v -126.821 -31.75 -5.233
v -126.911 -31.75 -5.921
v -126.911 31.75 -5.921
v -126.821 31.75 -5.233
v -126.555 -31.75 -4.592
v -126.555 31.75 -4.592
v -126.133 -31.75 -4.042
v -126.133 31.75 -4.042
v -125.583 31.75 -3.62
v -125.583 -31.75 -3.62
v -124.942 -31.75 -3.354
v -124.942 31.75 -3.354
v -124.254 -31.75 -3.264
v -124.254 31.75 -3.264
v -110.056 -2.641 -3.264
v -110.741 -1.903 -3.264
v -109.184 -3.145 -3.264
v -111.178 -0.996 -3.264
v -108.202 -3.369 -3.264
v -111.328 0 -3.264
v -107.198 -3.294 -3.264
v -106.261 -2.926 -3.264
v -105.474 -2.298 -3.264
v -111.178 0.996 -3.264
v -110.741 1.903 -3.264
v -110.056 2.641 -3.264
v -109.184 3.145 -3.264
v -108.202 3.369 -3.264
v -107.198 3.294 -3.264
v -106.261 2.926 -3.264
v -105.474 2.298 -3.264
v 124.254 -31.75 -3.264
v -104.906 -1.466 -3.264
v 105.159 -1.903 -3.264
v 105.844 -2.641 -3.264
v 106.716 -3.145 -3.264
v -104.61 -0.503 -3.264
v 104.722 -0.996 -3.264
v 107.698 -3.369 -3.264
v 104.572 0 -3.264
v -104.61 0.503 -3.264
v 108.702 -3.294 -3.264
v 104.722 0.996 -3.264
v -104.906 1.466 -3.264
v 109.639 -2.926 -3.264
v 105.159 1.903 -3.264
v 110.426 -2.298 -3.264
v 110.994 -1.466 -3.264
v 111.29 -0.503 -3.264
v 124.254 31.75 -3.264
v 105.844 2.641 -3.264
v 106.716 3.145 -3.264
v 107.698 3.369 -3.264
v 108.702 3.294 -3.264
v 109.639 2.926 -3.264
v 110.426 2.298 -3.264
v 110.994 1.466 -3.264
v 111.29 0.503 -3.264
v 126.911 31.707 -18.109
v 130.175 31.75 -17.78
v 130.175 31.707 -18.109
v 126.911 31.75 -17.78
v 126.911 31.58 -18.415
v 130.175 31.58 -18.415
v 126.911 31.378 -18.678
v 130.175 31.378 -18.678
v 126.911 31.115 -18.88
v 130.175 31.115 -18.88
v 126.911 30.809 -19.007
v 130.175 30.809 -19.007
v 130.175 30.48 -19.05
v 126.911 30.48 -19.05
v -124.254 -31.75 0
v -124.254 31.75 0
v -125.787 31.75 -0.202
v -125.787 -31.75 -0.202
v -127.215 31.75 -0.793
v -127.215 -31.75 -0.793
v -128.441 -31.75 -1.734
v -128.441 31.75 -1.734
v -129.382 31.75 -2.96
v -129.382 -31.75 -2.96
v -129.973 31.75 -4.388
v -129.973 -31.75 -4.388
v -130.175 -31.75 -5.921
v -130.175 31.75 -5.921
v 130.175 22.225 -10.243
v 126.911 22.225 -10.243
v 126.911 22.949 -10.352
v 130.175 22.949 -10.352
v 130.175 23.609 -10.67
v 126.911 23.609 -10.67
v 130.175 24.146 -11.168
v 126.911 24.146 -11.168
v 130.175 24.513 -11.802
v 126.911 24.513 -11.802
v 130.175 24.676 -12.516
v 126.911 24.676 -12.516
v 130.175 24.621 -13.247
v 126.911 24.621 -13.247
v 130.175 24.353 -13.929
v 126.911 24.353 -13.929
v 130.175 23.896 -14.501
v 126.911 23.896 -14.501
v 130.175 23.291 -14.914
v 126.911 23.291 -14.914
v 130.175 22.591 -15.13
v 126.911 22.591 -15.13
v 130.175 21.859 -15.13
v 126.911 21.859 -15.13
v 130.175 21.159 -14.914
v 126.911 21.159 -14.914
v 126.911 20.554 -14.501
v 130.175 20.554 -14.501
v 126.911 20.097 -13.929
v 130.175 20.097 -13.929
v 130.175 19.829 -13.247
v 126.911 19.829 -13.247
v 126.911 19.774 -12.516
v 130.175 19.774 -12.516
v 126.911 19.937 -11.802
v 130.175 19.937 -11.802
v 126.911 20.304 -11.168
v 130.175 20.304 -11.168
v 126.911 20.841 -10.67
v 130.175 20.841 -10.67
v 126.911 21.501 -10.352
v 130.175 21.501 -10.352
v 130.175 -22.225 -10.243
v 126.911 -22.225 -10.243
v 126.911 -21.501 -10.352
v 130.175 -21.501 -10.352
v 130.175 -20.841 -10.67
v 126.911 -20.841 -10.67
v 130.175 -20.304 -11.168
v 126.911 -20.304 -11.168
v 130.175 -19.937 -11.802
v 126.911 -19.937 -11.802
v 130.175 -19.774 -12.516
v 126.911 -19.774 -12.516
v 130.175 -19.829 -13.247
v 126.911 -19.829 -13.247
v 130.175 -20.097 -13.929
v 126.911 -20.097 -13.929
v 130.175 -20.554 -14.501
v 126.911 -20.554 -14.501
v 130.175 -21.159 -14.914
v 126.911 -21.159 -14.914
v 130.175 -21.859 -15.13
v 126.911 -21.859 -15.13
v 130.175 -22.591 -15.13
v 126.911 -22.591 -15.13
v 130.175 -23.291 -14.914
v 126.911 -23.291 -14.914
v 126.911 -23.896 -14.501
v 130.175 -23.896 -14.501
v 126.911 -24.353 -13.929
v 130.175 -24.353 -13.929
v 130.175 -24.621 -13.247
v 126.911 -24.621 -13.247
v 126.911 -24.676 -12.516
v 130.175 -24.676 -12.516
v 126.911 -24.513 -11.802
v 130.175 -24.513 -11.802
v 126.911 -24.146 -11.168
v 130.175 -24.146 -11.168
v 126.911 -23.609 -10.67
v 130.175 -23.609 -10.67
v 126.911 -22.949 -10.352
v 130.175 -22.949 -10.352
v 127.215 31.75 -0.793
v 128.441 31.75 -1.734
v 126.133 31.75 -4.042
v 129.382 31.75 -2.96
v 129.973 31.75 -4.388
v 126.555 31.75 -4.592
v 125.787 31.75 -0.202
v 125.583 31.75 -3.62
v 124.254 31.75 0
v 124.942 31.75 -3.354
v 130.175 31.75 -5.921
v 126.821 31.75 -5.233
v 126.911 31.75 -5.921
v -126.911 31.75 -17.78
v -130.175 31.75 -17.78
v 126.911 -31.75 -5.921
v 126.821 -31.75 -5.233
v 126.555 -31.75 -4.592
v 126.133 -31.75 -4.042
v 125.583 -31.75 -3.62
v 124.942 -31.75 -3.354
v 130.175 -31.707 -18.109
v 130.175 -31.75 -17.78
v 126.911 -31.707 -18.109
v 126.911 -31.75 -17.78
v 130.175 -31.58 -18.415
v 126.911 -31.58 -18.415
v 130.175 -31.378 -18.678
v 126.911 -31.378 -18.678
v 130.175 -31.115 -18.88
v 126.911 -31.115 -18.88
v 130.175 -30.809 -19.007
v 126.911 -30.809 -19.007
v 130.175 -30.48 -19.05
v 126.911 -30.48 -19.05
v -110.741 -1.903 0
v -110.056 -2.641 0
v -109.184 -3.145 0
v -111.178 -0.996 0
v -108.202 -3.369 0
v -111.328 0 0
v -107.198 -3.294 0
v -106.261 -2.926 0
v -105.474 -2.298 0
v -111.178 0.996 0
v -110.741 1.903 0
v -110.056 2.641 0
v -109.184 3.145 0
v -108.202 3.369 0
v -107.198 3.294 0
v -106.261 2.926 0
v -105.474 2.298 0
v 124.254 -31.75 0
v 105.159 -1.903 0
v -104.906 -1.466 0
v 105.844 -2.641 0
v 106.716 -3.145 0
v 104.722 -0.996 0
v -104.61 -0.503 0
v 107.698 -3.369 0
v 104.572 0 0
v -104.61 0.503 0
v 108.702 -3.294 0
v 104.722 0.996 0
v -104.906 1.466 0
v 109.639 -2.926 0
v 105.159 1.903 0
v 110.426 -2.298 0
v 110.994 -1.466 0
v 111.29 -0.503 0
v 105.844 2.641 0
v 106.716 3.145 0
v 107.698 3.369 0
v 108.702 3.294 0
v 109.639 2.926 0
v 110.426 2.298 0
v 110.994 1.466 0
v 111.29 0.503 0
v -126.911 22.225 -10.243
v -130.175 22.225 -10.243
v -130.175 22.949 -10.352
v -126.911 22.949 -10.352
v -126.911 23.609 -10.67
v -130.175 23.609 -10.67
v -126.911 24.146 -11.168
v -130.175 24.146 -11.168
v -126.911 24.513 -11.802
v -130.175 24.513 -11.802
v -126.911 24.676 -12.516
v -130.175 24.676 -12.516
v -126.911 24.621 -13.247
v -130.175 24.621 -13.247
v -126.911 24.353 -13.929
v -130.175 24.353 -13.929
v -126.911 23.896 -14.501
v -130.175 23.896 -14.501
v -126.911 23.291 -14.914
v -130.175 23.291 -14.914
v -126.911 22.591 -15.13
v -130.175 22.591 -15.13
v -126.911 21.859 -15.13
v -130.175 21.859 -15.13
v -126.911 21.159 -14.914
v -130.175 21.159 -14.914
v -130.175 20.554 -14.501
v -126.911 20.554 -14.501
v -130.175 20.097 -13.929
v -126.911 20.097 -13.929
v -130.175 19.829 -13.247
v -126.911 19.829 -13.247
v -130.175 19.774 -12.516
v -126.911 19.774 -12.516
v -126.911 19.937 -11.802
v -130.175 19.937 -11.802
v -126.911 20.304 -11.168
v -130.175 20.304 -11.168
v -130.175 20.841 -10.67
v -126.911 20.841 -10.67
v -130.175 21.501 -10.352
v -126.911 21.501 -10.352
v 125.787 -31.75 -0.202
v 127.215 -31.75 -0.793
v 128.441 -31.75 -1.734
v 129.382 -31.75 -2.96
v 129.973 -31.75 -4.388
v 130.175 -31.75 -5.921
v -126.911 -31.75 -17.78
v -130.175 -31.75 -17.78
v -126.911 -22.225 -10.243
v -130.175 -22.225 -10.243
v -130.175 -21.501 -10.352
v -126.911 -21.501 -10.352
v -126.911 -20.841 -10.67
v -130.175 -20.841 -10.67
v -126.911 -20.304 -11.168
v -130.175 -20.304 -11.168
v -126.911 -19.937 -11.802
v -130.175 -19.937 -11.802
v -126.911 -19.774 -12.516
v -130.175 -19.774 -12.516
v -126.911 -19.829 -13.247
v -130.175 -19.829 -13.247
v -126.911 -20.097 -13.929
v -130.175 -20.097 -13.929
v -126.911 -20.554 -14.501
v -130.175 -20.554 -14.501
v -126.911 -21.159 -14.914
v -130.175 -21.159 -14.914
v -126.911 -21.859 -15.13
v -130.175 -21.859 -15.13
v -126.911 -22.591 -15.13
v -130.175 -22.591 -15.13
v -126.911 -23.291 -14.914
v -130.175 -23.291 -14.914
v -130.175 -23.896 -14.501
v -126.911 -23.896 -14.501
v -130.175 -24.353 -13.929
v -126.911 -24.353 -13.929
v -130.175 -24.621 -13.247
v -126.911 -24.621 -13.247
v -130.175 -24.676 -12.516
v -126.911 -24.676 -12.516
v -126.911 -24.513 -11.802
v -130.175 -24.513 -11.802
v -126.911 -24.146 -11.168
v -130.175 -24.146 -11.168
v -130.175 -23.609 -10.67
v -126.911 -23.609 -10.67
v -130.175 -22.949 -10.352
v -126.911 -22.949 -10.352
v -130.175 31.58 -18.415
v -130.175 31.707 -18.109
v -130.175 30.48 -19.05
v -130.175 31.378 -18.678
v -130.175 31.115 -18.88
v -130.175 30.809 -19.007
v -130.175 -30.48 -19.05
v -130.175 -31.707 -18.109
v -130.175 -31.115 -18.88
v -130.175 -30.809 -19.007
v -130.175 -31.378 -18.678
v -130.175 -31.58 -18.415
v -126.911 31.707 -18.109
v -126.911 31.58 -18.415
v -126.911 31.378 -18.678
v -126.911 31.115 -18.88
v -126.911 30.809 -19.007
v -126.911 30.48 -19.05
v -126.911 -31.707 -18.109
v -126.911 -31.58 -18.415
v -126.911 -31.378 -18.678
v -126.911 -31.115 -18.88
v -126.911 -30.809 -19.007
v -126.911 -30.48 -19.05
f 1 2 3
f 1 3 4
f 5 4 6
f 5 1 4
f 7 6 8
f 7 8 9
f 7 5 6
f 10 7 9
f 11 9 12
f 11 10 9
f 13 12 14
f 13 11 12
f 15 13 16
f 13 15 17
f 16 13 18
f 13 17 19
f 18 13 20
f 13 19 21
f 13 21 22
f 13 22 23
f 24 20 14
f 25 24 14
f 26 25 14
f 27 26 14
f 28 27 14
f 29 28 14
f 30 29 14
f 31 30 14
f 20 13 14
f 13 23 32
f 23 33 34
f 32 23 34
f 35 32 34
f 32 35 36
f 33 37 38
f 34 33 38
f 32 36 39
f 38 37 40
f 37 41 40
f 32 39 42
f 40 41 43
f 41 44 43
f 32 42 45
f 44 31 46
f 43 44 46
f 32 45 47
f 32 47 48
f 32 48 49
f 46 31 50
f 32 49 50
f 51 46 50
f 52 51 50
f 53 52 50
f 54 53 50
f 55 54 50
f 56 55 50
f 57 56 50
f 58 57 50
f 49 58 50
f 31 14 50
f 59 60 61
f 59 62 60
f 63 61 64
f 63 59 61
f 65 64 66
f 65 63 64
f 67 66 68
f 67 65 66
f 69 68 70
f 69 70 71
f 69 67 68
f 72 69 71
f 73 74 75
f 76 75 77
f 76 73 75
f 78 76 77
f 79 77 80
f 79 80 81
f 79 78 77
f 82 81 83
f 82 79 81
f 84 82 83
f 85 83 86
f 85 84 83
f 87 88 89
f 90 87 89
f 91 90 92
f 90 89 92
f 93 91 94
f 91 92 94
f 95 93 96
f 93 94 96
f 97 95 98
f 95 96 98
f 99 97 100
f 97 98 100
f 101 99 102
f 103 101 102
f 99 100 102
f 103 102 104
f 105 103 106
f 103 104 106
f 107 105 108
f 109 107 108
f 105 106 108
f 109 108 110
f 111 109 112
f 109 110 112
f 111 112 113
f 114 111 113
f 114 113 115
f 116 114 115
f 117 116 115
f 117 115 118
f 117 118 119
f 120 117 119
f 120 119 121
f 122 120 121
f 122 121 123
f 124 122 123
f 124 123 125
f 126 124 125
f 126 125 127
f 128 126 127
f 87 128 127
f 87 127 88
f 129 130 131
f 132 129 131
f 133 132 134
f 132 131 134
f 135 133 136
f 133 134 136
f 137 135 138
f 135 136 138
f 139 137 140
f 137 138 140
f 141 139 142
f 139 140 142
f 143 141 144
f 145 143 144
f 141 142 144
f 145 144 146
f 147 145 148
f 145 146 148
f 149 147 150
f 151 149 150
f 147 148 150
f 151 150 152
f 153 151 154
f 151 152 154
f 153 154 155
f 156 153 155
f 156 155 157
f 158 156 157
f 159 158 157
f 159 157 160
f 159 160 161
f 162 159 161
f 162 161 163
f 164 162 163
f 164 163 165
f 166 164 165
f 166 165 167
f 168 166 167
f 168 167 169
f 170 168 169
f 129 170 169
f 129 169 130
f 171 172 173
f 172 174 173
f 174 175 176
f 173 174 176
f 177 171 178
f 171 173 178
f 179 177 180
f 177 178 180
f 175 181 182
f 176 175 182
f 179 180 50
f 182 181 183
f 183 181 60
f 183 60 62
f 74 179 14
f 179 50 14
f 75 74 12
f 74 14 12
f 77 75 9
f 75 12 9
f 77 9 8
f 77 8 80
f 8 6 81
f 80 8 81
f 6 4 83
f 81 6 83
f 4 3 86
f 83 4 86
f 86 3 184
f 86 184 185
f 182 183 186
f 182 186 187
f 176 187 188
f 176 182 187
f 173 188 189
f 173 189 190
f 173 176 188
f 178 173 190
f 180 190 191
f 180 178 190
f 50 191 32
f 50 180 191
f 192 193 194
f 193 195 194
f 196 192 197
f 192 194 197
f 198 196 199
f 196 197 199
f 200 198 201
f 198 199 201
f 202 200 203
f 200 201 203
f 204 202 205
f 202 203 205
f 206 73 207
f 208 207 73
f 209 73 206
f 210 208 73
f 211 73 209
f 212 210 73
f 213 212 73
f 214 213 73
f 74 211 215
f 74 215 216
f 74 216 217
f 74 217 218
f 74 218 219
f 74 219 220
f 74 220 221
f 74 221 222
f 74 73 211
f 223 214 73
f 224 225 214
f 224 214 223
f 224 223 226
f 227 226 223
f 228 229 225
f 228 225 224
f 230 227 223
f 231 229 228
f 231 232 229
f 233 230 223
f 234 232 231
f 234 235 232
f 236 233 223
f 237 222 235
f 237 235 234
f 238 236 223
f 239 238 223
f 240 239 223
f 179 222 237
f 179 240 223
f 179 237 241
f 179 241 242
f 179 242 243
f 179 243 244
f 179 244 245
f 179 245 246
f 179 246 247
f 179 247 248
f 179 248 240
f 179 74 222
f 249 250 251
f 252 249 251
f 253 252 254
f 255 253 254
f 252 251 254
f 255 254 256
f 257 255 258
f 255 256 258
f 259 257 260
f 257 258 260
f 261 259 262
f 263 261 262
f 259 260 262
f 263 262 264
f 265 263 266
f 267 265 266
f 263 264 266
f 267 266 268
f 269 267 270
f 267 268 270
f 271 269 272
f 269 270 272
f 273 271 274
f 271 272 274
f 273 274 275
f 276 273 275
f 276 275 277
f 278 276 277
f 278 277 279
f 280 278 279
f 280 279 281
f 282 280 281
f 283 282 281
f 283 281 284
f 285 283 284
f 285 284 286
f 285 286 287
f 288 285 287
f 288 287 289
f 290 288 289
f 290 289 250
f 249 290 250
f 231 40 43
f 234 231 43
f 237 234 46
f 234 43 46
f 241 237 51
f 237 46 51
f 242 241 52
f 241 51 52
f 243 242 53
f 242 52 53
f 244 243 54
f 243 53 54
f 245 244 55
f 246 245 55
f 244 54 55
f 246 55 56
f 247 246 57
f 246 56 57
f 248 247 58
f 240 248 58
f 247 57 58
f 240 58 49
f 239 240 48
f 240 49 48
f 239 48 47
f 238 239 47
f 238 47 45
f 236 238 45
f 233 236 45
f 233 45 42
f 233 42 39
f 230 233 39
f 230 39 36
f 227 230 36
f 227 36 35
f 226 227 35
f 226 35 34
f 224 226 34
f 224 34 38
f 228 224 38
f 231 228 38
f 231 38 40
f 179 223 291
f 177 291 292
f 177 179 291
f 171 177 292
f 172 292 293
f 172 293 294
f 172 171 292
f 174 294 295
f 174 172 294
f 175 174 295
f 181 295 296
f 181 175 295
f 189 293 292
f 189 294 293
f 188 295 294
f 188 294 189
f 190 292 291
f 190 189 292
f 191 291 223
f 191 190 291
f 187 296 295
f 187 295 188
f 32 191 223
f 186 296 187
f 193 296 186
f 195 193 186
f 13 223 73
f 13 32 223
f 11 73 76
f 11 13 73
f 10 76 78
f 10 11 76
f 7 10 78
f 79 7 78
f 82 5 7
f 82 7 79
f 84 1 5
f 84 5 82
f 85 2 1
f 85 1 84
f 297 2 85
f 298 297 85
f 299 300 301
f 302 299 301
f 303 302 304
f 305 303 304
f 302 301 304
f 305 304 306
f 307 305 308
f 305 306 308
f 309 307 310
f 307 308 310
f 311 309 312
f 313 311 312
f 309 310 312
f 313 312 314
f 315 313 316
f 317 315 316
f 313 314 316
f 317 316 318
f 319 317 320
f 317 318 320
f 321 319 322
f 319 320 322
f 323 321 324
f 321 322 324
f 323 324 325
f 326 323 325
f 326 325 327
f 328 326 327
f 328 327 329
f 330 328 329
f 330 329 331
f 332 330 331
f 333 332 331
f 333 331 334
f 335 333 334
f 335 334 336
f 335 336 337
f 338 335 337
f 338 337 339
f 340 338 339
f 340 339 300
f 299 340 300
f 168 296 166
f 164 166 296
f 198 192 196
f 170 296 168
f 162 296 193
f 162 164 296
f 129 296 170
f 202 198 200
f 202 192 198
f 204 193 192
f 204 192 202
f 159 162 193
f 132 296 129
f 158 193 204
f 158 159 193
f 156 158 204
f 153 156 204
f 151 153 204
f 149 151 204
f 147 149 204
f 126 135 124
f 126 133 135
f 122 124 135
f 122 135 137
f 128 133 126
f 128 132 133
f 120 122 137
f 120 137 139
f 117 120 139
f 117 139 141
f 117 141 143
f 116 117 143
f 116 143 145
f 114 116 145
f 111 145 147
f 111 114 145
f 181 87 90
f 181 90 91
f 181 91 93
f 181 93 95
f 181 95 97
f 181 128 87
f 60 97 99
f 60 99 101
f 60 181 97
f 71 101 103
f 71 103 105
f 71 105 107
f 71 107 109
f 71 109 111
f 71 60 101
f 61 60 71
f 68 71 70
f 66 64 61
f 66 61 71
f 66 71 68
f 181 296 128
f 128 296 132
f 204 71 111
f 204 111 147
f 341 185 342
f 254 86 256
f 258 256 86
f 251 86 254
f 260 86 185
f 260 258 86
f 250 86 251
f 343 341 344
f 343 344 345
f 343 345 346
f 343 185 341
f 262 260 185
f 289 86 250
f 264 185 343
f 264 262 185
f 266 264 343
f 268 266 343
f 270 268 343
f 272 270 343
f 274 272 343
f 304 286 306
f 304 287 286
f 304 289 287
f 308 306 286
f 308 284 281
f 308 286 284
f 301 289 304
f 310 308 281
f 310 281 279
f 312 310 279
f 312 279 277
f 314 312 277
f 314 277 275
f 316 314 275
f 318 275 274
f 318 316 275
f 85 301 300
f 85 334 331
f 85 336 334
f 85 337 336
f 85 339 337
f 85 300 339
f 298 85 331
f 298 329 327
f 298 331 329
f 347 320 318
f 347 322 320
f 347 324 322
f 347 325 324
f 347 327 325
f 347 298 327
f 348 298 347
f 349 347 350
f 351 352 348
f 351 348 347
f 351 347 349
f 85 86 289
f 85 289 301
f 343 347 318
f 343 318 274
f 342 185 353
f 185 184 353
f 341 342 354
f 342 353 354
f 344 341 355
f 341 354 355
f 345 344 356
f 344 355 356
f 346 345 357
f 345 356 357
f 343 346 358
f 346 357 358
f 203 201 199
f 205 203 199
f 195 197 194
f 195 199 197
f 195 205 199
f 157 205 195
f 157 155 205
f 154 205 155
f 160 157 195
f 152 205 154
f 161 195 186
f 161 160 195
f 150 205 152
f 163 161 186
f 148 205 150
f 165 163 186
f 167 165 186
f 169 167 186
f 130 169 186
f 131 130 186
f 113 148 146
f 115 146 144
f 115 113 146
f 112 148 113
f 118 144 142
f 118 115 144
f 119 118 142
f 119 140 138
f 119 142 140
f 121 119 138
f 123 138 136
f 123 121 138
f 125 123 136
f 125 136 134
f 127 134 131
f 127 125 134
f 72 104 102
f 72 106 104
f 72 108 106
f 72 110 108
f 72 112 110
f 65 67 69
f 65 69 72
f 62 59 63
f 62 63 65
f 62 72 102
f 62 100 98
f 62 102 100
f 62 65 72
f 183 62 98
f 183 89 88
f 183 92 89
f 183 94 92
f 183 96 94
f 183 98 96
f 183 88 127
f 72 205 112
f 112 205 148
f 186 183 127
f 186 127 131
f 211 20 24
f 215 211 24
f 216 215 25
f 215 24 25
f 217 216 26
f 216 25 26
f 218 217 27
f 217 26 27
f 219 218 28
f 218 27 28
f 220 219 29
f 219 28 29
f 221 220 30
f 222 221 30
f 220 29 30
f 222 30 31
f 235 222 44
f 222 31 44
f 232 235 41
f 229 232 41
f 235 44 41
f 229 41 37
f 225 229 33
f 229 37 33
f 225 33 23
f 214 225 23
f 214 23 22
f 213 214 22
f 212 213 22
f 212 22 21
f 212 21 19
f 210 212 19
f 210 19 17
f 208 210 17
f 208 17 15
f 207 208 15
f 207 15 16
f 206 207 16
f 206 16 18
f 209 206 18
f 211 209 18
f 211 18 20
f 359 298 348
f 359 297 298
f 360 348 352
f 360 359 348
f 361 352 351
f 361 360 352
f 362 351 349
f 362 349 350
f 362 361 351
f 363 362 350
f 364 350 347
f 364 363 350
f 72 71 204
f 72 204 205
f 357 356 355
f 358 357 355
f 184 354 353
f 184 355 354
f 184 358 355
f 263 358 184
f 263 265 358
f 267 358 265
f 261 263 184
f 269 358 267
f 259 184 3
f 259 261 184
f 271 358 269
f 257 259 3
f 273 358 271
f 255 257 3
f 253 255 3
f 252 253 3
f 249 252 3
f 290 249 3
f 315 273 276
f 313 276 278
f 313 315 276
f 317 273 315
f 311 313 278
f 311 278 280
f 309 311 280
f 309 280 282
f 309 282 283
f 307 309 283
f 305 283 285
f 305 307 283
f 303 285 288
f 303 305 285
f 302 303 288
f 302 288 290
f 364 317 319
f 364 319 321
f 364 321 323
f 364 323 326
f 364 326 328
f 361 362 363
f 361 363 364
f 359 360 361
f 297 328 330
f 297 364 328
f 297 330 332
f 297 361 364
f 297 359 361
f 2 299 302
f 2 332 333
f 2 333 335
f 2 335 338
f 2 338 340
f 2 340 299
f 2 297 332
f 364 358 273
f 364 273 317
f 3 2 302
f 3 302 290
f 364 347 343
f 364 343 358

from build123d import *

# Parameters (mm, degrees)
SKETCH1_W                      = 260.35
SKETCH1_H                      = 63.5
BASE_FLANGE1_DEPTH             = 3.2639
EDGE_FLANGE1_STRIP_W           = 18.36928
EDGE_FLANGE1_STRIP_H           = 3.2639
EDGE_FLANGE1_STRIP_CUT_DEPTH   = 63.5
EDGE_FLANGE1_STRIP_2_W         = 18.36928
EDGE_FLANGE1_STRIP_2_H         = 3.2639
EDGE_FLANGE1_STRIP_CUT_2_DEPTH = 63.5
EDGE_FLANGE1_DEPTH             = 63.5
EDGE_FLANGE1_BEND_DEPTH        = 63.5
F_10_0_1935_DIAMETER_HOLE1_D   = 4.9149
FILLET1_R                      = 1.27
F_1_4_CLEARANCE_HOLE1_D        = 6.7564


# Sheet-metal steps are written as plain solids
with BuildPart() as part:
    # Sketch1 → Base-Flange1 (new body)
    with BuildSketch(Plane.XY):
        Rectangle(SKETCH1_W, SKETCH1_H)
    extrude(amount=-BASE_FLANGE1_DEPTH)

    # Edge-Flange1 strip (across the edge) → Edge-Flange1 strip cut (cut)
    with BuildSketch(Plane(origin=(130.175, 31.75, -3.2639), x_dir=(-1, 0, 0), z_dir=(0, -1, 0))):
        with Locations((-3.2639, -1.63195)):
            Rectangle(EDGE_FLANGE1_STRIP_W, EDGE_FLANGE1_STRIP_H)
    extrude(amount=EDGE_FLANGE1_STRIP_CUT_DEPTH, mode=Mode.SUBTRACT)

    # Edge-Flange1 strip 2 (across the edge) → Edge-Flange1 strip cut 2 (cut)
    with BuildSketch(Plane(origin=(-130.175, -31.75, -3.2639), x_dir=(1, 0, 0), z_dir=(0, 1, 0))):
        with Locations((-3.2639, -1.63195)):
            Rectangle(EDGE_FLANGE1_STRIP_2_W, EDGE_FLANGE1_STRIP_2_H)
    extrude(amount=EDGE_FLANGE1_STRIP_CUT_2_DEPTH, mode=Mode.SUBTRACT)

    # Edge-Flange1 section (across the edge) → Edge-Flange1 (add)
    with BuildSketch(Plane(origin=(130.175, 31.75, -3.2639), x_dir=(-1, 0, 0), z_dir=(0, -1, 0))):
        with BuildLine():
            Line((0, 2.65684), (0, 15.7861))
            Line((0, 15.7861), (3.2639, 15.7861))
            Line((3.2639, 15.7861), (3.2639, 2.65684))
            ThreePointArc((3.2639, 2.65684), (4.042070419, 0.778170419), (5.92074, 0))
            Line((5.92074, 0), (5.92074, -3.2639))
            ThreePointArc((5.92074, -3.2639), (1.734144596, -1.529755404), (0, 2.65684))
        make_face()
    extrude(amount=EDGE_FLANGE1_DEPTH)

    # Edge-Flange1 section 2 (across the edge) → Edge-Flange1 bend (add)
    with BuildSketch(Plane(origin=(-130.175, -31.75, -3.2639), x_dir=(1, 0, 0), z_dir=(0, 1, 0))):
        with BuildLine():
            Line((0, 2.65684), (0, 15.7861))
            Line((0, 15.7861), (3.2639, 15.7861))
            Line((3.2639, 15.7861), (3.2639, 2.65684))
            ThreePointArc((3.2639, 2.65684), (4.042070419, 0.778170419), (5.92074, 0))
            Line((5.92074, 0), (5.92074, -3.2639))
            ThreePointArc((5.92074, -3.2639), (1.734144596, -1.529755404), (0, 2.65684))
        make_face()
    extrude(amount=EDGE_FLANGE1_BEND_DEPTH)

    # #10 (0.1935) Diameter Hole1 (through all)
    with Locations(Plane(origin=(130.175, 0, 0), x_dir=(0, 0, -1), z_dir=(1, 0, 0))):
        with Locations((12.7, 22.225), (12.7, -22.225)):
            Hole(F_10_0_1935_DIAMETER_HOLE1_D / 2)

    # Fillet1
    fillet1_edges = [part.edges().sort_by_distance(p)[0] for p in [
        (128.54305, 31.75, -19.05),
        (128.54305, -31.75, -19.05),
        (-128.54305, -31.75, -19.05),
        (-128.54305, 31.75, -19.05),
    ]]
    fillet(fillet1_edges, radius=FILLET1_R)

    # 1/4 Clearance Hole1 (through all)
    with Locations(Plane.XY):
        with Locations((-107.95, 0), (107.95, 0)):
            Hole(F_1_4_CLEARANCE_HOLE1_D / 2)


solid = part.part
